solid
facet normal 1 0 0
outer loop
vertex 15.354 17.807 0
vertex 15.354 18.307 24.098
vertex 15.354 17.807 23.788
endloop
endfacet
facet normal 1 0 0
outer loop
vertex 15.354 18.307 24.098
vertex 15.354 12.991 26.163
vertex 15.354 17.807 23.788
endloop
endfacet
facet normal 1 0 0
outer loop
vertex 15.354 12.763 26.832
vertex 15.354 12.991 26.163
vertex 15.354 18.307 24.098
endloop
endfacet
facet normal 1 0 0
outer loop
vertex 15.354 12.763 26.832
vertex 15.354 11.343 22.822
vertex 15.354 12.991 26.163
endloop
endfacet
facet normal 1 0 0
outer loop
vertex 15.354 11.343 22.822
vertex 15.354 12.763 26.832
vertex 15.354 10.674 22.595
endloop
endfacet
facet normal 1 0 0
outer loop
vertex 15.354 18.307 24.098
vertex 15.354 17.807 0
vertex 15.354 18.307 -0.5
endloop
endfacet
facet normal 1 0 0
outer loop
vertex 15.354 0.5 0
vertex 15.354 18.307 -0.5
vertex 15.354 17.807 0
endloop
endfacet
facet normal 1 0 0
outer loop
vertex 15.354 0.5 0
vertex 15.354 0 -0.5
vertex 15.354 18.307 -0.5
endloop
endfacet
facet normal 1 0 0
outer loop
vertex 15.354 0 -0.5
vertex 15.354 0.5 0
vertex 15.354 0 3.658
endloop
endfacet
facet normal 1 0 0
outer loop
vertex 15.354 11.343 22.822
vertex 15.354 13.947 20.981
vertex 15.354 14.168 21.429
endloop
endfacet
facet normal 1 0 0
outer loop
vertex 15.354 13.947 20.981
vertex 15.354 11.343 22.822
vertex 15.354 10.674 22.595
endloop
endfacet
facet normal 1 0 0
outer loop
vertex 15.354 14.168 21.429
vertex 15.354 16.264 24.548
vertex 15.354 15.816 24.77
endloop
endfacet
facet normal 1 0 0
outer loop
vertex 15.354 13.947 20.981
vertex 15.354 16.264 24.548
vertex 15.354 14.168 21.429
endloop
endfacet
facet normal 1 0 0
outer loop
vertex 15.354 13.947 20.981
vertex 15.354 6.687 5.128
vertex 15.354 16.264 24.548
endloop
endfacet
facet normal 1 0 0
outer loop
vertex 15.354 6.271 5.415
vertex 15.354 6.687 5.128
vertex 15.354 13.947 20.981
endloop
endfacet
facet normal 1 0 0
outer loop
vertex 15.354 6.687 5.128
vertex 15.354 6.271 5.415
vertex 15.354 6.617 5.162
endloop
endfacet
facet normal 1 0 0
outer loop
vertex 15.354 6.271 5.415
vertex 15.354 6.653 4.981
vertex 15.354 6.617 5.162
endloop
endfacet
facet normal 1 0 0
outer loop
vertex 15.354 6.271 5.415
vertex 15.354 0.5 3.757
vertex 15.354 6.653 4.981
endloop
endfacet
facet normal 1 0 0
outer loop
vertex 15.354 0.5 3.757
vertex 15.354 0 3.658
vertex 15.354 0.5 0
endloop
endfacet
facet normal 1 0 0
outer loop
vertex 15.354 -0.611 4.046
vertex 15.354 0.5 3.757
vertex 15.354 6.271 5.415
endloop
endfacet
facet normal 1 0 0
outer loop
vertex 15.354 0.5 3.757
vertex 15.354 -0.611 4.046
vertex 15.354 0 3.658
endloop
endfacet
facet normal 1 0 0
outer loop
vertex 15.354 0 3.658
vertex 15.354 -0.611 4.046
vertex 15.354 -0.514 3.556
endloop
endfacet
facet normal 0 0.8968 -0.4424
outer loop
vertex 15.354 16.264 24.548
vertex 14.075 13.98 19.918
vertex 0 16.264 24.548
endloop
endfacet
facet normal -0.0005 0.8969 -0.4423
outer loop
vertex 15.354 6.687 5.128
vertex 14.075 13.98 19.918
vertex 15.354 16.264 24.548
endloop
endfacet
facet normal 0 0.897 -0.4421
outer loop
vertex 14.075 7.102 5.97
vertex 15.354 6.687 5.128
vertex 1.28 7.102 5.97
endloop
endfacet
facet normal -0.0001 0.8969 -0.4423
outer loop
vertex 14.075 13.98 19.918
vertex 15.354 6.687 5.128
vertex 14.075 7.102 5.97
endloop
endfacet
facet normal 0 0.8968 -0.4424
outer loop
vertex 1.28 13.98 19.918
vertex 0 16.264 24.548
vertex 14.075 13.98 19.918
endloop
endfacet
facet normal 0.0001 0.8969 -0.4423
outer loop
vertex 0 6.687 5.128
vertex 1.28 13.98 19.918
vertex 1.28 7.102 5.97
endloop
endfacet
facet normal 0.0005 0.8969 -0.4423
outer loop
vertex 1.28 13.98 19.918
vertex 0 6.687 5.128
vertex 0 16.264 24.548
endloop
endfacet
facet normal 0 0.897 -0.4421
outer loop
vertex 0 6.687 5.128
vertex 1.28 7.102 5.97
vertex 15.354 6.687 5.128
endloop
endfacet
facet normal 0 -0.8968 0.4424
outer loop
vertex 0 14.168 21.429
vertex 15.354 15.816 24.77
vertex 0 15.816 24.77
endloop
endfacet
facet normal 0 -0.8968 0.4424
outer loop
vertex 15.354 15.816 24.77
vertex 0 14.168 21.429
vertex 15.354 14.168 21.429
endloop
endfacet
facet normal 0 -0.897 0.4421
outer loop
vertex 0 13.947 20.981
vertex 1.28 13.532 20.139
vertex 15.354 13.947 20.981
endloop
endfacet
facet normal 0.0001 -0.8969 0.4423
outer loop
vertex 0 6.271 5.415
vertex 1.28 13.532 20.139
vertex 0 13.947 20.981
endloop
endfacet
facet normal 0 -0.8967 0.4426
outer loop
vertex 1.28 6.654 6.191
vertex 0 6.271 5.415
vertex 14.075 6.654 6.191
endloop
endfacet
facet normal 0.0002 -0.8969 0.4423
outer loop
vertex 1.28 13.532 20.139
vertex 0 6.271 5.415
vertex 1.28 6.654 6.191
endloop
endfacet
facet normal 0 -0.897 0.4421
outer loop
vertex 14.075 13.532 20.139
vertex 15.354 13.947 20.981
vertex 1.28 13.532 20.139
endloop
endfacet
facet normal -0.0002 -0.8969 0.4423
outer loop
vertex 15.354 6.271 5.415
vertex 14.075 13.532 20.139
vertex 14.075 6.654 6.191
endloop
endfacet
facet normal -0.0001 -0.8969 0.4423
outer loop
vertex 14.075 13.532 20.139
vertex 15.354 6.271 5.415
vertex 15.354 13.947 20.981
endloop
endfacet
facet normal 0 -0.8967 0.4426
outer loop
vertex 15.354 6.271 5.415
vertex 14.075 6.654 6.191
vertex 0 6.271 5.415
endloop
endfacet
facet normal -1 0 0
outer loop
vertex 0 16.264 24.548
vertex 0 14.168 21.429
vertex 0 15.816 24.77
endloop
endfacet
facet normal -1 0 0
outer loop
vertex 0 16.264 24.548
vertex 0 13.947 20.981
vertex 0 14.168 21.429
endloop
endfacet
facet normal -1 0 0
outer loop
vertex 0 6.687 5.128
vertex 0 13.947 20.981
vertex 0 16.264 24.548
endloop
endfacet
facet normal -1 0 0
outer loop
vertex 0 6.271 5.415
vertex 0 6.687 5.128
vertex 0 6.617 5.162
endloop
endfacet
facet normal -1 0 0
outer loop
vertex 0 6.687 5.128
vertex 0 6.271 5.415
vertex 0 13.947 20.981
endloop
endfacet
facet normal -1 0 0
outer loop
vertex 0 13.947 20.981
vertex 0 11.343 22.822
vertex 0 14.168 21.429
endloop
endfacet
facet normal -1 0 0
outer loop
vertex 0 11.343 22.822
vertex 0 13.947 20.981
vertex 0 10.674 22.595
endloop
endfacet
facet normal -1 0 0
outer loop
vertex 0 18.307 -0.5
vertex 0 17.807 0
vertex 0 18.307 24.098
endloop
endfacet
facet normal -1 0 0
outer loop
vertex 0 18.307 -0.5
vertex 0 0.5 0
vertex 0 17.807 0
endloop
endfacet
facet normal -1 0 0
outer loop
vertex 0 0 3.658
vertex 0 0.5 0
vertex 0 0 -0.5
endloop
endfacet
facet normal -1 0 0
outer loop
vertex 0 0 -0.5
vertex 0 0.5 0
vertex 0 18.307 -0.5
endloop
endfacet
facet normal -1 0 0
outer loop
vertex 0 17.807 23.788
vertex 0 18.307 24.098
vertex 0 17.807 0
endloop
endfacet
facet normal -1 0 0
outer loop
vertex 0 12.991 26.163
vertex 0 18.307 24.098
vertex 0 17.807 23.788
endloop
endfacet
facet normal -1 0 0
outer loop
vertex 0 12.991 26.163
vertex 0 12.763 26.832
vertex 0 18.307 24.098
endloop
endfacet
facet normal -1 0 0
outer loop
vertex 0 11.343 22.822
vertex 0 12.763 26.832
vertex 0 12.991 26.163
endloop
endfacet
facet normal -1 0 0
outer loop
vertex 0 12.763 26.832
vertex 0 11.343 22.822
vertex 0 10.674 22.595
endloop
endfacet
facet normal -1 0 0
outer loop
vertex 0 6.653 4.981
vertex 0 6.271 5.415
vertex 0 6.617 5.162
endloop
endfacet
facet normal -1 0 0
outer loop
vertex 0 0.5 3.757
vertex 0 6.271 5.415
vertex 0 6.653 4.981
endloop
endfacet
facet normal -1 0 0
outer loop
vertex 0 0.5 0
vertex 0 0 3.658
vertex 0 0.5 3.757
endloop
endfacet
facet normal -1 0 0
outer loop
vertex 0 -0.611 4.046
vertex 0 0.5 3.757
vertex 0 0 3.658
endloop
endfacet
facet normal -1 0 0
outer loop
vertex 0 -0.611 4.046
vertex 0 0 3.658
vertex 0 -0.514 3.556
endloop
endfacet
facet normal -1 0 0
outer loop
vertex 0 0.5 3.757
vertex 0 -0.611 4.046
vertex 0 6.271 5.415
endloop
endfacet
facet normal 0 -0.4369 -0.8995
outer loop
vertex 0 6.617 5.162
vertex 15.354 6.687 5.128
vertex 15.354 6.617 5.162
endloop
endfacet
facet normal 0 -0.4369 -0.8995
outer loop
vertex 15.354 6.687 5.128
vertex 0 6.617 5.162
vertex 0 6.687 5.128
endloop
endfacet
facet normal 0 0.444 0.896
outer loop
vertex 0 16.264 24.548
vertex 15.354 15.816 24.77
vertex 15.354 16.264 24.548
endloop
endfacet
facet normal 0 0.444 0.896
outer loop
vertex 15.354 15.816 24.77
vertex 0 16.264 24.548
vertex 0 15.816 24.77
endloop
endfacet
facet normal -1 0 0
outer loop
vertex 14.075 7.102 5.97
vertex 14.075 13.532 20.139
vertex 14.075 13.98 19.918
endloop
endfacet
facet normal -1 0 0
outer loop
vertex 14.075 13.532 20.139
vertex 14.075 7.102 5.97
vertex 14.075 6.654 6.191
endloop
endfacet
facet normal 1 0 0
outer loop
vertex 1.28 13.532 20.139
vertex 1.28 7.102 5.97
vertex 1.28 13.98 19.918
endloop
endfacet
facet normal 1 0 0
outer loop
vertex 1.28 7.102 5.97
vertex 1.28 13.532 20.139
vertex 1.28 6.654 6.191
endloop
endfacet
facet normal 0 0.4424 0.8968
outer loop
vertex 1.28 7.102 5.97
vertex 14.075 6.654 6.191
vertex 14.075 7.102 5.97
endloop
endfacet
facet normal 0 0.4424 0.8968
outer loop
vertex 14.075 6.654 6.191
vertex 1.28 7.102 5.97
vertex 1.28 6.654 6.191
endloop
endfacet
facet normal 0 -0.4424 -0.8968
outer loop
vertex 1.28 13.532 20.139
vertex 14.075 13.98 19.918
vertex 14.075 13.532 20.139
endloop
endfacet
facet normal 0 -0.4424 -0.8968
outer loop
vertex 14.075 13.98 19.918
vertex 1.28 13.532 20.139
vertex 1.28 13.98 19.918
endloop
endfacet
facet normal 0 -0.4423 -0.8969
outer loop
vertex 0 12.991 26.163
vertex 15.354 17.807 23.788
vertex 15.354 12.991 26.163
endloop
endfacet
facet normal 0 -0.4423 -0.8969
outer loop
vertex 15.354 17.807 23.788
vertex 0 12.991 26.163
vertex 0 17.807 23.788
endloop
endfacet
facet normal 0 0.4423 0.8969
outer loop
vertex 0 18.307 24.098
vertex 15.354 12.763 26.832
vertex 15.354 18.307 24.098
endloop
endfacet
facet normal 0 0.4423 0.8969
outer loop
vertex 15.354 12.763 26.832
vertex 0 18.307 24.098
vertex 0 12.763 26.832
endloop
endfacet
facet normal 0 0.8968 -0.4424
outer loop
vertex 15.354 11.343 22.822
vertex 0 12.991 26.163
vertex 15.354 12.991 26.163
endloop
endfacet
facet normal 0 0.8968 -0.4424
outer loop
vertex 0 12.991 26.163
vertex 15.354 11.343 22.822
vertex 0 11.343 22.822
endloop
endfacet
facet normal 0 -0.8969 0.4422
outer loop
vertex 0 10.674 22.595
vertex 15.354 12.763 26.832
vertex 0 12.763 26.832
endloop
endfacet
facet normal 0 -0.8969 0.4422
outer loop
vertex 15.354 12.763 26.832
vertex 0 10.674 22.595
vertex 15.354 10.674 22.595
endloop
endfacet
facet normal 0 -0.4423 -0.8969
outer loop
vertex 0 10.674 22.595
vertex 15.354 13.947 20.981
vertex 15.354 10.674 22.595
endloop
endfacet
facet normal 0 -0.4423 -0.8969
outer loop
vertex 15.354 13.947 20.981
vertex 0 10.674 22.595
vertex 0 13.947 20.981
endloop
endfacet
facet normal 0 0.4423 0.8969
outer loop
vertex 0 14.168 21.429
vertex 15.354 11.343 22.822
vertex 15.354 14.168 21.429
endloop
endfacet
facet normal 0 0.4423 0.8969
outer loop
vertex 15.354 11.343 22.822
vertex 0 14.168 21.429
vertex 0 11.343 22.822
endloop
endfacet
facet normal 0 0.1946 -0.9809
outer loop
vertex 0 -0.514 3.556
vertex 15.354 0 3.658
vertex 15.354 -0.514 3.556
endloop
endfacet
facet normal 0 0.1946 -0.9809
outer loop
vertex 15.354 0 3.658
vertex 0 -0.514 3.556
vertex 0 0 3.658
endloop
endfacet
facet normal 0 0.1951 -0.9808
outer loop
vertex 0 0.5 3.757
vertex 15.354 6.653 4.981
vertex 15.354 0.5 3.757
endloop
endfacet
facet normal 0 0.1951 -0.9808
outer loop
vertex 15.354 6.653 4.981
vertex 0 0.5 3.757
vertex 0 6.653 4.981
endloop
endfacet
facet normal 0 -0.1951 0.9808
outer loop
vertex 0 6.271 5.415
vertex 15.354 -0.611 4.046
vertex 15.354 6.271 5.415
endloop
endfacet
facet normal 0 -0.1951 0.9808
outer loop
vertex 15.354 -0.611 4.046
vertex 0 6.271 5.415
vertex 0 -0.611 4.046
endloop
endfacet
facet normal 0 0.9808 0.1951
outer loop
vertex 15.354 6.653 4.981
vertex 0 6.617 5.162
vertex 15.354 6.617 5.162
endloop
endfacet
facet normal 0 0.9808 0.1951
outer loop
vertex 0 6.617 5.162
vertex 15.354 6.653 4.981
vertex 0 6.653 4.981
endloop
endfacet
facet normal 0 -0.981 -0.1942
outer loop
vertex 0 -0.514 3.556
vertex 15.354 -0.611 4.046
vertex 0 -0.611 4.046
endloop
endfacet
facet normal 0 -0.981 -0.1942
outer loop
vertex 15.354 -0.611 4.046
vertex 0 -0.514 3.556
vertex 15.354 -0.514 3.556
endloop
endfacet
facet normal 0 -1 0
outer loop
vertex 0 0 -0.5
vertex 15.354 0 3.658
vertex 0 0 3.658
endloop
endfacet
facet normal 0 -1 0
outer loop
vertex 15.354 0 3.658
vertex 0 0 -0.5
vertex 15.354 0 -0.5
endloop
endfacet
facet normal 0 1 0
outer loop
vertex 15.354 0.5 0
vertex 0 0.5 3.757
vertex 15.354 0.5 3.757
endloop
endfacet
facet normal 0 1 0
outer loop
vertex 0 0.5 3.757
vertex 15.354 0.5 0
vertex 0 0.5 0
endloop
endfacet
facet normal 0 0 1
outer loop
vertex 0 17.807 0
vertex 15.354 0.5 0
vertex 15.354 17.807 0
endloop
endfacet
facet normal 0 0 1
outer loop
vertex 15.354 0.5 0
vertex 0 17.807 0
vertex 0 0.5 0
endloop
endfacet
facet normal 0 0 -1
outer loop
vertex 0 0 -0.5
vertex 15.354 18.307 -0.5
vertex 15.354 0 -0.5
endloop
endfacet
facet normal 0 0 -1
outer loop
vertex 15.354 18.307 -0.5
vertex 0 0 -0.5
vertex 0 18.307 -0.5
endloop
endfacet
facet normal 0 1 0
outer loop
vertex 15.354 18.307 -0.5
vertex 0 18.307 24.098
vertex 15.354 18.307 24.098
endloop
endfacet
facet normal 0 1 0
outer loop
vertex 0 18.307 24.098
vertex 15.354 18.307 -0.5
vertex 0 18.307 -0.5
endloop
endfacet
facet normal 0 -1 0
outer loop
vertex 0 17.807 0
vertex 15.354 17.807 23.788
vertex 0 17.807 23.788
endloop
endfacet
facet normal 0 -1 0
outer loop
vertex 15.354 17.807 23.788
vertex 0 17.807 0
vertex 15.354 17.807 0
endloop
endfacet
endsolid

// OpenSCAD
scale([1/2.54, 1/2.54, 1/2.54]) {
    scale([1, 1, 1]) {
        
        t = 2.54/2;
        w = 39;
        backH = 61.21;
        bottomD = 46.5;
        marqueH = 12;
        frontH = 43 + marqueH;
        
        
        union() {
            // CP Front
            color("lightgray") translate([0, t, 0]) rotate([90,0,0]) cube([w,9.9,t]);
            // Bottom
            color("slategray") translate([0, 0, -t]) cube([w,bottomD,t]);
            // Back
            color("black") translate([0, bottomD, 0]) rotate([90,0,0]) cube([w,backH,t]);
            
            // Marque/Screen Assembly
            translate([0, bottomD, backH]) rotate([180-26.25,0,0]) {
                // Top
                color("blue") cube([w,14.43,t]);
                // Marque
                color("yellow") translate([0, 14.43+t, 0]) rotate([90,0,0]) cube([w,marqueH,t]);
                // Marque Bottom
                color("cyan") translate([0, 14.43, marqueH]) rotate([180,0,0]) cube([w,8,t]);
                // Front
                color("green") translate([0, 14.43-8, t]) rotate([90,0,0]) difference() {
                    cube([w,frontH,t]);
                    translate([w/2, marqueH/2+frontH/2-t/2, t/2]) cube([32.5, 39.5, t+1], true);
                }
                // CP
                color("magenta") 
                    translate([0, 14.48-8-t/2, t+43+marqueH-t/2]) 
                    rotate([127.5-90,0,0]) 
                    cube([w,18.56,t]);
            }

        }
    }
}
